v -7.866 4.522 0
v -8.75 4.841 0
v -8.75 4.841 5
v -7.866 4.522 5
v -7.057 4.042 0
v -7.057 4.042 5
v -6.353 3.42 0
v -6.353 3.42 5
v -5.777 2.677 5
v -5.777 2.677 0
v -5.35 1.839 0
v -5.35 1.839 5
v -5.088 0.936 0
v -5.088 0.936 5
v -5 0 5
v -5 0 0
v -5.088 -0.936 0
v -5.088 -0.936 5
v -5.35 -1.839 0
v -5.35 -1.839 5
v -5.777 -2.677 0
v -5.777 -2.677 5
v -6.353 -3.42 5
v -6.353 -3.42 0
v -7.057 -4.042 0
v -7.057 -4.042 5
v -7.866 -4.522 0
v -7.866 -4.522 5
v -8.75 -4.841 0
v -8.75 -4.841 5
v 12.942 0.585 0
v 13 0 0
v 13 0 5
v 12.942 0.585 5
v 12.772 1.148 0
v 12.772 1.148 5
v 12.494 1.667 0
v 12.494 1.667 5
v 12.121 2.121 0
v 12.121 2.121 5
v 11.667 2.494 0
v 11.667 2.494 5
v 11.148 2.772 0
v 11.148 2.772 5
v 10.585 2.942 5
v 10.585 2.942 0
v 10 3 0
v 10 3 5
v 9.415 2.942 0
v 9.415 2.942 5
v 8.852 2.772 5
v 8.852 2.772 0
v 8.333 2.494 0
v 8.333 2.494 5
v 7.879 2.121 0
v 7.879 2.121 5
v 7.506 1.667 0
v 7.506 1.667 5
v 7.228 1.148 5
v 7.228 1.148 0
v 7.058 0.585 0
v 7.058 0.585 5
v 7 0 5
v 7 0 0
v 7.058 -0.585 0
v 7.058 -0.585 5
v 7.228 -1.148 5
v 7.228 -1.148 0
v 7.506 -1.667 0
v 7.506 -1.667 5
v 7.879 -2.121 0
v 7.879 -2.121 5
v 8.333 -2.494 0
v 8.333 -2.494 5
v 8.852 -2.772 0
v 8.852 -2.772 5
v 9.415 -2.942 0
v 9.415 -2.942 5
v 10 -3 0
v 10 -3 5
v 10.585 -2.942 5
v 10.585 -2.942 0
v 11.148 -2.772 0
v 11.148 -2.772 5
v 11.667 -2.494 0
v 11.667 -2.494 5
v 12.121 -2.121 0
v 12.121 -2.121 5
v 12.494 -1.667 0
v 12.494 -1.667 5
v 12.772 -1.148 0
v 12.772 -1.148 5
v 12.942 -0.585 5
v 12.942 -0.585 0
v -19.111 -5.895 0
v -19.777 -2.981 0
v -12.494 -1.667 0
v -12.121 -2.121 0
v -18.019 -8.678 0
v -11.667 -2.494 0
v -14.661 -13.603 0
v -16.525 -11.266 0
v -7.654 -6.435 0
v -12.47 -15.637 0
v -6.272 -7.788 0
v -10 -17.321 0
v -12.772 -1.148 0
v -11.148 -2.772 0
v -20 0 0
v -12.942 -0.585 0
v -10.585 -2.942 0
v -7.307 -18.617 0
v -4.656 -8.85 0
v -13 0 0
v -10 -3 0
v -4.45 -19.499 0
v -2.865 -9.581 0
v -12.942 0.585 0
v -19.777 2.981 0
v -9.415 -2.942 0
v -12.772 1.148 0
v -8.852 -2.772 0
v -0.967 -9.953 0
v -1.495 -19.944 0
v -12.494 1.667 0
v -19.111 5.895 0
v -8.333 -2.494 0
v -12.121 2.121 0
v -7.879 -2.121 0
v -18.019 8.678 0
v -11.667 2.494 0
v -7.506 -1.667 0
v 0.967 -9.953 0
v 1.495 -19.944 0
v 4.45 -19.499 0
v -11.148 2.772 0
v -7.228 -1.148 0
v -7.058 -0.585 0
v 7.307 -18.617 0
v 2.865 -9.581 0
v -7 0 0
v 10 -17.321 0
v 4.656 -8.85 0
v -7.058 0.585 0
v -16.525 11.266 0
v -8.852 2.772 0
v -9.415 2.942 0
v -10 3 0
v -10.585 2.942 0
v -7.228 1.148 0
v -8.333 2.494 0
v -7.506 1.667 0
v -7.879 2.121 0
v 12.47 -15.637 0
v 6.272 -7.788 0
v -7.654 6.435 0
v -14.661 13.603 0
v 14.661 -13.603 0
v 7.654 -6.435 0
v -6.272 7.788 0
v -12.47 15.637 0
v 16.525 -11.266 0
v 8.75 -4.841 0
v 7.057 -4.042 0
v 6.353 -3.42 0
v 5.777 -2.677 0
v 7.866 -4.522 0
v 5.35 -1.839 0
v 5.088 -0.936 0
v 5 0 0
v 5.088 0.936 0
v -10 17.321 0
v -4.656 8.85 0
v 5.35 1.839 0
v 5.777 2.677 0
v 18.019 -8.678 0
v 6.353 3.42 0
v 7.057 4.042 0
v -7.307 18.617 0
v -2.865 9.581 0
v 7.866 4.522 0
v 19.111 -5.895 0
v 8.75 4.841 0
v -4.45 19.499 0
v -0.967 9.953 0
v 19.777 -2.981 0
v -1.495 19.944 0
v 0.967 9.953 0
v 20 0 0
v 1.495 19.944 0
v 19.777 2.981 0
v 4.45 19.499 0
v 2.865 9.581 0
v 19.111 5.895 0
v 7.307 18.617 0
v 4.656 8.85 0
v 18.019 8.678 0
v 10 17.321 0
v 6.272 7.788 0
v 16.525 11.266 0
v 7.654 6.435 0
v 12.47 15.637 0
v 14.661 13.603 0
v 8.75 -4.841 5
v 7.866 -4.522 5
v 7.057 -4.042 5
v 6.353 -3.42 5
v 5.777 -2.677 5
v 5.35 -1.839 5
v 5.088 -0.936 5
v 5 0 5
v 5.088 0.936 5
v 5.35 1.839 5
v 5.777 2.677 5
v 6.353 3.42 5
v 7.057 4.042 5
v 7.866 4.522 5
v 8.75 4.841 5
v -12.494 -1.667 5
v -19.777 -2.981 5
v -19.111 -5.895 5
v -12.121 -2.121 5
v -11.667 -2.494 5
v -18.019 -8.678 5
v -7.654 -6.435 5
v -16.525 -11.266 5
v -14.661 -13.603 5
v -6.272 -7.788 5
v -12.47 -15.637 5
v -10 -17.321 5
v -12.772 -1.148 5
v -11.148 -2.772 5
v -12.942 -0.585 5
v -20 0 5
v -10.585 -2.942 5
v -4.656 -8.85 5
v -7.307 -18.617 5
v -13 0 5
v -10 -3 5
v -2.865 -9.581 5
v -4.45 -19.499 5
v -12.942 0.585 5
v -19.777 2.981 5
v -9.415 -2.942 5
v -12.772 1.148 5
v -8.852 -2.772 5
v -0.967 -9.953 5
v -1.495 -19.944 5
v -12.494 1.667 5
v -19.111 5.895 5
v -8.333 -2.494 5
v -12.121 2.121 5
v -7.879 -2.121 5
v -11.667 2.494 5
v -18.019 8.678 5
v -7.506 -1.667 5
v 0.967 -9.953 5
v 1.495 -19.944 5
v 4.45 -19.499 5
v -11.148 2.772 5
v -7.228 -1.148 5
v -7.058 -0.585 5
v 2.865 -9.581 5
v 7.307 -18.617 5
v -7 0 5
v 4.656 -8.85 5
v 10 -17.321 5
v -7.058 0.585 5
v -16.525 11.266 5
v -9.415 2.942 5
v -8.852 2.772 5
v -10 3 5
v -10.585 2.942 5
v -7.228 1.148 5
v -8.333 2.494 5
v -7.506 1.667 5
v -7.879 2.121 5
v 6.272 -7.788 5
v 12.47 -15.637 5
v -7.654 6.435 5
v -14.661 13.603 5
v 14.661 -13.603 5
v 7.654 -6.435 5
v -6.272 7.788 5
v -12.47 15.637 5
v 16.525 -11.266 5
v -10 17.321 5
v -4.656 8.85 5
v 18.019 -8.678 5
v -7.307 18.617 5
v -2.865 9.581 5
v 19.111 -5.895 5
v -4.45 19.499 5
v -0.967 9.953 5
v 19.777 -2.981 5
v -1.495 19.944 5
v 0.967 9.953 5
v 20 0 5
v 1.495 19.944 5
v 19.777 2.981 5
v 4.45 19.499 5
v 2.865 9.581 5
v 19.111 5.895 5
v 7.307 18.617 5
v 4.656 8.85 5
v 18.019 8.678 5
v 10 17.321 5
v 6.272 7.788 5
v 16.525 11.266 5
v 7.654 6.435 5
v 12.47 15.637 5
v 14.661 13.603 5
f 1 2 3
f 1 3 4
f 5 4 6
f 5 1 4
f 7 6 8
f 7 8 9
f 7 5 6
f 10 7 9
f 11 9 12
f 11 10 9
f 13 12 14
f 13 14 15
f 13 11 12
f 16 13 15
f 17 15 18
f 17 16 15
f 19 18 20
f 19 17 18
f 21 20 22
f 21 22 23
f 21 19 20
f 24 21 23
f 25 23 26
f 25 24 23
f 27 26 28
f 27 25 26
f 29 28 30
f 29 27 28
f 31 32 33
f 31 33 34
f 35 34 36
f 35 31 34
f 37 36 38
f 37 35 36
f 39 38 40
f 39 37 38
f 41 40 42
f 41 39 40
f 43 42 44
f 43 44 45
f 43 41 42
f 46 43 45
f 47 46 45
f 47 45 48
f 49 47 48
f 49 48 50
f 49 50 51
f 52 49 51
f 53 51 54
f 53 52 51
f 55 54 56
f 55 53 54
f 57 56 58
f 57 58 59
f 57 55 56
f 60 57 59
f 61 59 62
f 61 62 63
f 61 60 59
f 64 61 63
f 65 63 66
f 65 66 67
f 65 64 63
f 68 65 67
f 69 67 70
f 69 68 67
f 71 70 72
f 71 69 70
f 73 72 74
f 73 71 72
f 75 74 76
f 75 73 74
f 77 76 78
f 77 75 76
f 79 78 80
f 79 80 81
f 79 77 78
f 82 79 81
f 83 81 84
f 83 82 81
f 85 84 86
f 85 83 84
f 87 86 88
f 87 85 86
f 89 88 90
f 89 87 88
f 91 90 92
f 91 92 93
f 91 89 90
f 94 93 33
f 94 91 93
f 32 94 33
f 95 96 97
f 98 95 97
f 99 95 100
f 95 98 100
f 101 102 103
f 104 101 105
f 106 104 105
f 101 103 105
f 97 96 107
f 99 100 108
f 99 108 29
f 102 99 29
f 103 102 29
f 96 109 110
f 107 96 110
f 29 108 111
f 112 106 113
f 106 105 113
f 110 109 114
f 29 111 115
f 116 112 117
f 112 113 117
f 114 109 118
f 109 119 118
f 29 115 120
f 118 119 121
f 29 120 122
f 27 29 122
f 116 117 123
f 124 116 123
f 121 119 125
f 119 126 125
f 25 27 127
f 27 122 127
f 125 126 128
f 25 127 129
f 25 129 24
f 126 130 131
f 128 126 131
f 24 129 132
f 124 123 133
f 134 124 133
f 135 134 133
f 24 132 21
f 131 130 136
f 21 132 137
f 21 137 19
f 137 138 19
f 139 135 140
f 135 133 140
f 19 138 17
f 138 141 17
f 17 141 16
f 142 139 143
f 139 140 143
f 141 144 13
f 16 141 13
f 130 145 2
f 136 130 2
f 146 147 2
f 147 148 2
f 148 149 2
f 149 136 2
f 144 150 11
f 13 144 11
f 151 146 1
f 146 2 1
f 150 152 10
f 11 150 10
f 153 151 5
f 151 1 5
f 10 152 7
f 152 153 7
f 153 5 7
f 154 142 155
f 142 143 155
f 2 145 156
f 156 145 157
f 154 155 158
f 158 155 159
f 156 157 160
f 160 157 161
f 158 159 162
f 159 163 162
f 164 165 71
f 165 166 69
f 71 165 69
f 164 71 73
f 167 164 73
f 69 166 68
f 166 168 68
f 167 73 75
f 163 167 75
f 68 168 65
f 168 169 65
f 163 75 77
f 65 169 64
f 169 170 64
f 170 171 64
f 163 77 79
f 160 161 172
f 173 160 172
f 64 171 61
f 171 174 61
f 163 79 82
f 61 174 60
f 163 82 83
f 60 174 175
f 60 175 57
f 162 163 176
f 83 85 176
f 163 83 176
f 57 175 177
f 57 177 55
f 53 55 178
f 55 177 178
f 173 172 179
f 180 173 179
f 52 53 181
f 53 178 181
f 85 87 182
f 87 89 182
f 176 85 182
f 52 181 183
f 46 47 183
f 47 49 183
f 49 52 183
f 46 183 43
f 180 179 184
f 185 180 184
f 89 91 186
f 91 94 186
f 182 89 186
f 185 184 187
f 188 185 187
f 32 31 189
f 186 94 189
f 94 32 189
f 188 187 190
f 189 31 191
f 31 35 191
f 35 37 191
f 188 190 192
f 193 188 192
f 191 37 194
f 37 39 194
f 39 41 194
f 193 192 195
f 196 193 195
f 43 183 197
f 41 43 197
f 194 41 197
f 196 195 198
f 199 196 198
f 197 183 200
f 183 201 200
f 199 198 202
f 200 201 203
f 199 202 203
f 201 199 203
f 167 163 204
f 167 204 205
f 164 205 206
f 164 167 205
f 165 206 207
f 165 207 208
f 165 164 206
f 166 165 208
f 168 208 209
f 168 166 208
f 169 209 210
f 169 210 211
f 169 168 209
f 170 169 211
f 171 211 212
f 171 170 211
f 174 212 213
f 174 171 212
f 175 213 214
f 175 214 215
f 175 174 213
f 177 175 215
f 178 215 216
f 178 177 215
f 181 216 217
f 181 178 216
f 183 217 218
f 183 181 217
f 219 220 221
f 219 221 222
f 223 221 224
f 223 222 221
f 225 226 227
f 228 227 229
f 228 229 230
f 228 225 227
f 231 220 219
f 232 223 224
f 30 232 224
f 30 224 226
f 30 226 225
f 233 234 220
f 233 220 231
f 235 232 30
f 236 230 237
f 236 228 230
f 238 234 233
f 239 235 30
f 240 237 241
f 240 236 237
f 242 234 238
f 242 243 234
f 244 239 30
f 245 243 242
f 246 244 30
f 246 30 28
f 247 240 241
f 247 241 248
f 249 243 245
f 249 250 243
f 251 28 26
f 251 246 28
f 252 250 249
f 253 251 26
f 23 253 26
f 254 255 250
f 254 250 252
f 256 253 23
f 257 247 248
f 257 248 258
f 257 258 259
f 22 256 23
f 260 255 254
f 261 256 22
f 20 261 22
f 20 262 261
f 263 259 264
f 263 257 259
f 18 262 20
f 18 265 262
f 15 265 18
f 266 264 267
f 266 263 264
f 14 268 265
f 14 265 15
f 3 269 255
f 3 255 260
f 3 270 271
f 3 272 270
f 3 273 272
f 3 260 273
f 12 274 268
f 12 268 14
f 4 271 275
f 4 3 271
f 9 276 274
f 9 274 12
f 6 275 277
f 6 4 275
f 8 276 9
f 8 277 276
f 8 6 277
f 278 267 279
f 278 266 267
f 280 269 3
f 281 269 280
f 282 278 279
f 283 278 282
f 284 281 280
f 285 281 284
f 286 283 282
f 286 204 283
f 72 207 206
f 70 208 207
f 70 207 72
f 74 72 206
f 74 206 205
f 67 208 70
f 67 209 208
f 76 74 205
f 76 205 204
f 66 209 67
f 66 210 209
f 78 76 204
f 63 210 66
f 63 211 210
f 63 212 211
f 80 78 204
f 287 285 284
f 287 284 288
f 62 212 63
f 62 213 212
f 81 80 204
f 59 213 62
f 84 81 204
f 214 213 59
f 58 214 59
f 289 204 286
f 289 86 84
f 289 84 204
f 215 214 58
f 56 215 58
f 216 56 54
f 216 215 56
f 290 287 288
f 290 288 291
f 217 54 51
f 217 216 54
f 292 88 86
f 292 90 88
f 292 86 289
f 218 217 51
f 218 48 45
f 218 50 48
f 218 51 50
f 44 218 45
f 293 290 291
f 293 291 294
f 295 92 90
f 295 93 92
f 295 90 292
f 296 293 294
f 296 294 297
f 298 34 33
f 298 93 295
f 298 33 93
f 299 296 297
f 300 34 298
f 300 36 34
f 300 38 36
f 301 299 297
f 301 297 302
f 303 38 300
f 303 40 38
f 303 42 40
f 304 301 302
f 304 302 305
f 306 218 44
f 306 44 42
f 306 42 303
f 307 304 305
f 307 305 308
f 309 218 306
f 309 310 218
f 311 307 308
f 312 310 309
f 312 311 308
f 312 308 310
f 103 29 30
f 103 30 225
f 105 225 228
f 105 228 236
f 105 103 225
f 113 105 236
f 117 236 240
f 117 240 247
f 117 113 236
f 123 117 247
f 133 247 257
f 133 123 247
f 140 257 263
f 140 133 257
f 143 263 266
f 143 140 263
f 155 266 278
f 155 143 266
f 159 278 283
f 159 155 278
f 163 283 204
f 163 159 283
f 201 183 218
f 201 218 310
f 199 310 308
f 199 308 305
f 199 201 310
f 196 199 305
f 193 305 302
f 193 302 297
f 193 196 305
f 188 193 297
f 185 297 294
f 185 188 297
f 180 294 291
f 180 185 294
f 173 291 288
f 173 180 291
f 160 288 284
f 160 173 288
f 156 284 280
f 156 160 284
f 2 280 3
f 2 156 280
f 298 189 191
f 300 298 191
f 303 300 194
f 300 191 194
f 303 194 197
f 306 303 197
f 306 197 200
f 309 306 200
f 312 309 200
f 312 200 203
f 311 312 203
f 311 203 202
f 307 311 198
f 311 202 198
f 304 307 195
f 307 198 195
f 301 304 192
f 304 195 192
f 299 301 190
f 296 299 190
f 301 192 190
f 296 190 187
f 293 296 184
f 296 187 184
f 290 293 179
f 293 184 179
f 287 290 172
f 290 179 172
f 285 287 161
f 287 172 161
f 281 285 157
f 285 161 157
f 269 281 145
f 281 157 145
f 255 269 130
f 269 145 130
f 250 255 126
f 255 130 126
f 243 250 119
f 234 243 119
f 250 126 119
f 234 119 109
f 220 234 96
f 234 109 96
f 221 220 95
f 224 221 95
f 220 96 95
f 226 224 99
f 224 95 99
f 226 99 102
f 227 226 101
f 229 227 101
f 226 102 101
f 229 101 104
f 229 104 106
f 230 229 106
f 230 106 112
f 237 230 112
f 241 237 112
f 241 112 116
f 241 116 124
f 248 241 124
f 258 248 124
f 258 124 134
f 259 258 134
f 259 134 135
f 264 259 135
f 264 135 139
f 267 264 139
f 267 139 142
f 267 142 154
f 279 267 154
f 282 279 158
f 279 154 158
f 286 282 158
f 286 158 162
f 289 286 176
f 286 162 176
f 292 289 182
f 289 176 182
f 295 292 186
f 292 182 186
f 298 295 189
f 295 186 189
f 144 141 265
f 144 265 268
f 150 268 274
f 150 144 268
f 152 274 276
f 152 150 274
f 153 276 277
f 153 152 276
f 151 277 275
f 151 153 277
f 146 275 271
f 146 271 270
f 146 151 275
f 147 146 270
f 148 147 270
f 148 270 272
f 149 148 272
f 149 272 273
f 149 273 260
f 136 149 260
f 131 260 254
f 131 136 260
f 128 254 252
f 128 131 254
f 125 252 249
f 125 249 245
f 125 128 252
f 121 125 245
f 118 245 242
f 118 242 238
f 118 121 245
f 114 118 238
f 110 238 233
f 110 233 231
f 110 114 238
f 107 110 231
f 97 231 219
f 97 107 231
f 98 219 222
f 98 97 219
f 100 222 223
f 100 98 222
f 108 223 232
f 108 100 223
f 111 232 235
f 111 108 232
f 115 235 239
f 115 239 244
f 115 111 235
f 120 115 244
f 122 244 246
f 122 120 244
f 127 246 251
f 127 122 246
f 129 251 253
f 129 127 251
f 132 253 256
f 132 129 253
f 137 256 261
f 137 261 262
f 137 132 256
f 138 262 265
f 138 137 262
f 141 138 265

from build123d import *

# Parameters (mm, degrees)
CROQUIS1_R              = 20
CROQUIS1_R_2            = 3
SALIENTE_EXTRUIR1_DEPTH = 5


with BuildPart() as part:
    # Croquis1 → Saliente-Extruir1 (new body)
    with BuildSketch(Plane.XY):
        Circle(CROQUIS1_R)
        with Locations((10, 0)):
            Circle(CROQUIS1_R_2, mode=Mode.SUBTRACT)
        with Locations((-10, 0)):
            Circle(CROQUIS1_R_2, mode=Mode.SUBTRACT)
        with BuildLine():
            ThreePointArc((8.75, 4.841229183), (0, 10), (-8.75, 4.841229183))
            ThreePointArc((-8.75, 4.841229183), (-5, 0), (-8.75, -4.841229183))
            ThreePointArc((-8.75, -4.841229183), (0, -10), (8.75, -4.841229183))
            ThreePointArc((8.75, -4.841229183), (5, 0), (8.75, 4.841229183))
        make_face(mode=Mode.SUBTRACT)
    extrude(amount=SALIENTE_EXTRUIR1_DEPTH)


solid = part.part
